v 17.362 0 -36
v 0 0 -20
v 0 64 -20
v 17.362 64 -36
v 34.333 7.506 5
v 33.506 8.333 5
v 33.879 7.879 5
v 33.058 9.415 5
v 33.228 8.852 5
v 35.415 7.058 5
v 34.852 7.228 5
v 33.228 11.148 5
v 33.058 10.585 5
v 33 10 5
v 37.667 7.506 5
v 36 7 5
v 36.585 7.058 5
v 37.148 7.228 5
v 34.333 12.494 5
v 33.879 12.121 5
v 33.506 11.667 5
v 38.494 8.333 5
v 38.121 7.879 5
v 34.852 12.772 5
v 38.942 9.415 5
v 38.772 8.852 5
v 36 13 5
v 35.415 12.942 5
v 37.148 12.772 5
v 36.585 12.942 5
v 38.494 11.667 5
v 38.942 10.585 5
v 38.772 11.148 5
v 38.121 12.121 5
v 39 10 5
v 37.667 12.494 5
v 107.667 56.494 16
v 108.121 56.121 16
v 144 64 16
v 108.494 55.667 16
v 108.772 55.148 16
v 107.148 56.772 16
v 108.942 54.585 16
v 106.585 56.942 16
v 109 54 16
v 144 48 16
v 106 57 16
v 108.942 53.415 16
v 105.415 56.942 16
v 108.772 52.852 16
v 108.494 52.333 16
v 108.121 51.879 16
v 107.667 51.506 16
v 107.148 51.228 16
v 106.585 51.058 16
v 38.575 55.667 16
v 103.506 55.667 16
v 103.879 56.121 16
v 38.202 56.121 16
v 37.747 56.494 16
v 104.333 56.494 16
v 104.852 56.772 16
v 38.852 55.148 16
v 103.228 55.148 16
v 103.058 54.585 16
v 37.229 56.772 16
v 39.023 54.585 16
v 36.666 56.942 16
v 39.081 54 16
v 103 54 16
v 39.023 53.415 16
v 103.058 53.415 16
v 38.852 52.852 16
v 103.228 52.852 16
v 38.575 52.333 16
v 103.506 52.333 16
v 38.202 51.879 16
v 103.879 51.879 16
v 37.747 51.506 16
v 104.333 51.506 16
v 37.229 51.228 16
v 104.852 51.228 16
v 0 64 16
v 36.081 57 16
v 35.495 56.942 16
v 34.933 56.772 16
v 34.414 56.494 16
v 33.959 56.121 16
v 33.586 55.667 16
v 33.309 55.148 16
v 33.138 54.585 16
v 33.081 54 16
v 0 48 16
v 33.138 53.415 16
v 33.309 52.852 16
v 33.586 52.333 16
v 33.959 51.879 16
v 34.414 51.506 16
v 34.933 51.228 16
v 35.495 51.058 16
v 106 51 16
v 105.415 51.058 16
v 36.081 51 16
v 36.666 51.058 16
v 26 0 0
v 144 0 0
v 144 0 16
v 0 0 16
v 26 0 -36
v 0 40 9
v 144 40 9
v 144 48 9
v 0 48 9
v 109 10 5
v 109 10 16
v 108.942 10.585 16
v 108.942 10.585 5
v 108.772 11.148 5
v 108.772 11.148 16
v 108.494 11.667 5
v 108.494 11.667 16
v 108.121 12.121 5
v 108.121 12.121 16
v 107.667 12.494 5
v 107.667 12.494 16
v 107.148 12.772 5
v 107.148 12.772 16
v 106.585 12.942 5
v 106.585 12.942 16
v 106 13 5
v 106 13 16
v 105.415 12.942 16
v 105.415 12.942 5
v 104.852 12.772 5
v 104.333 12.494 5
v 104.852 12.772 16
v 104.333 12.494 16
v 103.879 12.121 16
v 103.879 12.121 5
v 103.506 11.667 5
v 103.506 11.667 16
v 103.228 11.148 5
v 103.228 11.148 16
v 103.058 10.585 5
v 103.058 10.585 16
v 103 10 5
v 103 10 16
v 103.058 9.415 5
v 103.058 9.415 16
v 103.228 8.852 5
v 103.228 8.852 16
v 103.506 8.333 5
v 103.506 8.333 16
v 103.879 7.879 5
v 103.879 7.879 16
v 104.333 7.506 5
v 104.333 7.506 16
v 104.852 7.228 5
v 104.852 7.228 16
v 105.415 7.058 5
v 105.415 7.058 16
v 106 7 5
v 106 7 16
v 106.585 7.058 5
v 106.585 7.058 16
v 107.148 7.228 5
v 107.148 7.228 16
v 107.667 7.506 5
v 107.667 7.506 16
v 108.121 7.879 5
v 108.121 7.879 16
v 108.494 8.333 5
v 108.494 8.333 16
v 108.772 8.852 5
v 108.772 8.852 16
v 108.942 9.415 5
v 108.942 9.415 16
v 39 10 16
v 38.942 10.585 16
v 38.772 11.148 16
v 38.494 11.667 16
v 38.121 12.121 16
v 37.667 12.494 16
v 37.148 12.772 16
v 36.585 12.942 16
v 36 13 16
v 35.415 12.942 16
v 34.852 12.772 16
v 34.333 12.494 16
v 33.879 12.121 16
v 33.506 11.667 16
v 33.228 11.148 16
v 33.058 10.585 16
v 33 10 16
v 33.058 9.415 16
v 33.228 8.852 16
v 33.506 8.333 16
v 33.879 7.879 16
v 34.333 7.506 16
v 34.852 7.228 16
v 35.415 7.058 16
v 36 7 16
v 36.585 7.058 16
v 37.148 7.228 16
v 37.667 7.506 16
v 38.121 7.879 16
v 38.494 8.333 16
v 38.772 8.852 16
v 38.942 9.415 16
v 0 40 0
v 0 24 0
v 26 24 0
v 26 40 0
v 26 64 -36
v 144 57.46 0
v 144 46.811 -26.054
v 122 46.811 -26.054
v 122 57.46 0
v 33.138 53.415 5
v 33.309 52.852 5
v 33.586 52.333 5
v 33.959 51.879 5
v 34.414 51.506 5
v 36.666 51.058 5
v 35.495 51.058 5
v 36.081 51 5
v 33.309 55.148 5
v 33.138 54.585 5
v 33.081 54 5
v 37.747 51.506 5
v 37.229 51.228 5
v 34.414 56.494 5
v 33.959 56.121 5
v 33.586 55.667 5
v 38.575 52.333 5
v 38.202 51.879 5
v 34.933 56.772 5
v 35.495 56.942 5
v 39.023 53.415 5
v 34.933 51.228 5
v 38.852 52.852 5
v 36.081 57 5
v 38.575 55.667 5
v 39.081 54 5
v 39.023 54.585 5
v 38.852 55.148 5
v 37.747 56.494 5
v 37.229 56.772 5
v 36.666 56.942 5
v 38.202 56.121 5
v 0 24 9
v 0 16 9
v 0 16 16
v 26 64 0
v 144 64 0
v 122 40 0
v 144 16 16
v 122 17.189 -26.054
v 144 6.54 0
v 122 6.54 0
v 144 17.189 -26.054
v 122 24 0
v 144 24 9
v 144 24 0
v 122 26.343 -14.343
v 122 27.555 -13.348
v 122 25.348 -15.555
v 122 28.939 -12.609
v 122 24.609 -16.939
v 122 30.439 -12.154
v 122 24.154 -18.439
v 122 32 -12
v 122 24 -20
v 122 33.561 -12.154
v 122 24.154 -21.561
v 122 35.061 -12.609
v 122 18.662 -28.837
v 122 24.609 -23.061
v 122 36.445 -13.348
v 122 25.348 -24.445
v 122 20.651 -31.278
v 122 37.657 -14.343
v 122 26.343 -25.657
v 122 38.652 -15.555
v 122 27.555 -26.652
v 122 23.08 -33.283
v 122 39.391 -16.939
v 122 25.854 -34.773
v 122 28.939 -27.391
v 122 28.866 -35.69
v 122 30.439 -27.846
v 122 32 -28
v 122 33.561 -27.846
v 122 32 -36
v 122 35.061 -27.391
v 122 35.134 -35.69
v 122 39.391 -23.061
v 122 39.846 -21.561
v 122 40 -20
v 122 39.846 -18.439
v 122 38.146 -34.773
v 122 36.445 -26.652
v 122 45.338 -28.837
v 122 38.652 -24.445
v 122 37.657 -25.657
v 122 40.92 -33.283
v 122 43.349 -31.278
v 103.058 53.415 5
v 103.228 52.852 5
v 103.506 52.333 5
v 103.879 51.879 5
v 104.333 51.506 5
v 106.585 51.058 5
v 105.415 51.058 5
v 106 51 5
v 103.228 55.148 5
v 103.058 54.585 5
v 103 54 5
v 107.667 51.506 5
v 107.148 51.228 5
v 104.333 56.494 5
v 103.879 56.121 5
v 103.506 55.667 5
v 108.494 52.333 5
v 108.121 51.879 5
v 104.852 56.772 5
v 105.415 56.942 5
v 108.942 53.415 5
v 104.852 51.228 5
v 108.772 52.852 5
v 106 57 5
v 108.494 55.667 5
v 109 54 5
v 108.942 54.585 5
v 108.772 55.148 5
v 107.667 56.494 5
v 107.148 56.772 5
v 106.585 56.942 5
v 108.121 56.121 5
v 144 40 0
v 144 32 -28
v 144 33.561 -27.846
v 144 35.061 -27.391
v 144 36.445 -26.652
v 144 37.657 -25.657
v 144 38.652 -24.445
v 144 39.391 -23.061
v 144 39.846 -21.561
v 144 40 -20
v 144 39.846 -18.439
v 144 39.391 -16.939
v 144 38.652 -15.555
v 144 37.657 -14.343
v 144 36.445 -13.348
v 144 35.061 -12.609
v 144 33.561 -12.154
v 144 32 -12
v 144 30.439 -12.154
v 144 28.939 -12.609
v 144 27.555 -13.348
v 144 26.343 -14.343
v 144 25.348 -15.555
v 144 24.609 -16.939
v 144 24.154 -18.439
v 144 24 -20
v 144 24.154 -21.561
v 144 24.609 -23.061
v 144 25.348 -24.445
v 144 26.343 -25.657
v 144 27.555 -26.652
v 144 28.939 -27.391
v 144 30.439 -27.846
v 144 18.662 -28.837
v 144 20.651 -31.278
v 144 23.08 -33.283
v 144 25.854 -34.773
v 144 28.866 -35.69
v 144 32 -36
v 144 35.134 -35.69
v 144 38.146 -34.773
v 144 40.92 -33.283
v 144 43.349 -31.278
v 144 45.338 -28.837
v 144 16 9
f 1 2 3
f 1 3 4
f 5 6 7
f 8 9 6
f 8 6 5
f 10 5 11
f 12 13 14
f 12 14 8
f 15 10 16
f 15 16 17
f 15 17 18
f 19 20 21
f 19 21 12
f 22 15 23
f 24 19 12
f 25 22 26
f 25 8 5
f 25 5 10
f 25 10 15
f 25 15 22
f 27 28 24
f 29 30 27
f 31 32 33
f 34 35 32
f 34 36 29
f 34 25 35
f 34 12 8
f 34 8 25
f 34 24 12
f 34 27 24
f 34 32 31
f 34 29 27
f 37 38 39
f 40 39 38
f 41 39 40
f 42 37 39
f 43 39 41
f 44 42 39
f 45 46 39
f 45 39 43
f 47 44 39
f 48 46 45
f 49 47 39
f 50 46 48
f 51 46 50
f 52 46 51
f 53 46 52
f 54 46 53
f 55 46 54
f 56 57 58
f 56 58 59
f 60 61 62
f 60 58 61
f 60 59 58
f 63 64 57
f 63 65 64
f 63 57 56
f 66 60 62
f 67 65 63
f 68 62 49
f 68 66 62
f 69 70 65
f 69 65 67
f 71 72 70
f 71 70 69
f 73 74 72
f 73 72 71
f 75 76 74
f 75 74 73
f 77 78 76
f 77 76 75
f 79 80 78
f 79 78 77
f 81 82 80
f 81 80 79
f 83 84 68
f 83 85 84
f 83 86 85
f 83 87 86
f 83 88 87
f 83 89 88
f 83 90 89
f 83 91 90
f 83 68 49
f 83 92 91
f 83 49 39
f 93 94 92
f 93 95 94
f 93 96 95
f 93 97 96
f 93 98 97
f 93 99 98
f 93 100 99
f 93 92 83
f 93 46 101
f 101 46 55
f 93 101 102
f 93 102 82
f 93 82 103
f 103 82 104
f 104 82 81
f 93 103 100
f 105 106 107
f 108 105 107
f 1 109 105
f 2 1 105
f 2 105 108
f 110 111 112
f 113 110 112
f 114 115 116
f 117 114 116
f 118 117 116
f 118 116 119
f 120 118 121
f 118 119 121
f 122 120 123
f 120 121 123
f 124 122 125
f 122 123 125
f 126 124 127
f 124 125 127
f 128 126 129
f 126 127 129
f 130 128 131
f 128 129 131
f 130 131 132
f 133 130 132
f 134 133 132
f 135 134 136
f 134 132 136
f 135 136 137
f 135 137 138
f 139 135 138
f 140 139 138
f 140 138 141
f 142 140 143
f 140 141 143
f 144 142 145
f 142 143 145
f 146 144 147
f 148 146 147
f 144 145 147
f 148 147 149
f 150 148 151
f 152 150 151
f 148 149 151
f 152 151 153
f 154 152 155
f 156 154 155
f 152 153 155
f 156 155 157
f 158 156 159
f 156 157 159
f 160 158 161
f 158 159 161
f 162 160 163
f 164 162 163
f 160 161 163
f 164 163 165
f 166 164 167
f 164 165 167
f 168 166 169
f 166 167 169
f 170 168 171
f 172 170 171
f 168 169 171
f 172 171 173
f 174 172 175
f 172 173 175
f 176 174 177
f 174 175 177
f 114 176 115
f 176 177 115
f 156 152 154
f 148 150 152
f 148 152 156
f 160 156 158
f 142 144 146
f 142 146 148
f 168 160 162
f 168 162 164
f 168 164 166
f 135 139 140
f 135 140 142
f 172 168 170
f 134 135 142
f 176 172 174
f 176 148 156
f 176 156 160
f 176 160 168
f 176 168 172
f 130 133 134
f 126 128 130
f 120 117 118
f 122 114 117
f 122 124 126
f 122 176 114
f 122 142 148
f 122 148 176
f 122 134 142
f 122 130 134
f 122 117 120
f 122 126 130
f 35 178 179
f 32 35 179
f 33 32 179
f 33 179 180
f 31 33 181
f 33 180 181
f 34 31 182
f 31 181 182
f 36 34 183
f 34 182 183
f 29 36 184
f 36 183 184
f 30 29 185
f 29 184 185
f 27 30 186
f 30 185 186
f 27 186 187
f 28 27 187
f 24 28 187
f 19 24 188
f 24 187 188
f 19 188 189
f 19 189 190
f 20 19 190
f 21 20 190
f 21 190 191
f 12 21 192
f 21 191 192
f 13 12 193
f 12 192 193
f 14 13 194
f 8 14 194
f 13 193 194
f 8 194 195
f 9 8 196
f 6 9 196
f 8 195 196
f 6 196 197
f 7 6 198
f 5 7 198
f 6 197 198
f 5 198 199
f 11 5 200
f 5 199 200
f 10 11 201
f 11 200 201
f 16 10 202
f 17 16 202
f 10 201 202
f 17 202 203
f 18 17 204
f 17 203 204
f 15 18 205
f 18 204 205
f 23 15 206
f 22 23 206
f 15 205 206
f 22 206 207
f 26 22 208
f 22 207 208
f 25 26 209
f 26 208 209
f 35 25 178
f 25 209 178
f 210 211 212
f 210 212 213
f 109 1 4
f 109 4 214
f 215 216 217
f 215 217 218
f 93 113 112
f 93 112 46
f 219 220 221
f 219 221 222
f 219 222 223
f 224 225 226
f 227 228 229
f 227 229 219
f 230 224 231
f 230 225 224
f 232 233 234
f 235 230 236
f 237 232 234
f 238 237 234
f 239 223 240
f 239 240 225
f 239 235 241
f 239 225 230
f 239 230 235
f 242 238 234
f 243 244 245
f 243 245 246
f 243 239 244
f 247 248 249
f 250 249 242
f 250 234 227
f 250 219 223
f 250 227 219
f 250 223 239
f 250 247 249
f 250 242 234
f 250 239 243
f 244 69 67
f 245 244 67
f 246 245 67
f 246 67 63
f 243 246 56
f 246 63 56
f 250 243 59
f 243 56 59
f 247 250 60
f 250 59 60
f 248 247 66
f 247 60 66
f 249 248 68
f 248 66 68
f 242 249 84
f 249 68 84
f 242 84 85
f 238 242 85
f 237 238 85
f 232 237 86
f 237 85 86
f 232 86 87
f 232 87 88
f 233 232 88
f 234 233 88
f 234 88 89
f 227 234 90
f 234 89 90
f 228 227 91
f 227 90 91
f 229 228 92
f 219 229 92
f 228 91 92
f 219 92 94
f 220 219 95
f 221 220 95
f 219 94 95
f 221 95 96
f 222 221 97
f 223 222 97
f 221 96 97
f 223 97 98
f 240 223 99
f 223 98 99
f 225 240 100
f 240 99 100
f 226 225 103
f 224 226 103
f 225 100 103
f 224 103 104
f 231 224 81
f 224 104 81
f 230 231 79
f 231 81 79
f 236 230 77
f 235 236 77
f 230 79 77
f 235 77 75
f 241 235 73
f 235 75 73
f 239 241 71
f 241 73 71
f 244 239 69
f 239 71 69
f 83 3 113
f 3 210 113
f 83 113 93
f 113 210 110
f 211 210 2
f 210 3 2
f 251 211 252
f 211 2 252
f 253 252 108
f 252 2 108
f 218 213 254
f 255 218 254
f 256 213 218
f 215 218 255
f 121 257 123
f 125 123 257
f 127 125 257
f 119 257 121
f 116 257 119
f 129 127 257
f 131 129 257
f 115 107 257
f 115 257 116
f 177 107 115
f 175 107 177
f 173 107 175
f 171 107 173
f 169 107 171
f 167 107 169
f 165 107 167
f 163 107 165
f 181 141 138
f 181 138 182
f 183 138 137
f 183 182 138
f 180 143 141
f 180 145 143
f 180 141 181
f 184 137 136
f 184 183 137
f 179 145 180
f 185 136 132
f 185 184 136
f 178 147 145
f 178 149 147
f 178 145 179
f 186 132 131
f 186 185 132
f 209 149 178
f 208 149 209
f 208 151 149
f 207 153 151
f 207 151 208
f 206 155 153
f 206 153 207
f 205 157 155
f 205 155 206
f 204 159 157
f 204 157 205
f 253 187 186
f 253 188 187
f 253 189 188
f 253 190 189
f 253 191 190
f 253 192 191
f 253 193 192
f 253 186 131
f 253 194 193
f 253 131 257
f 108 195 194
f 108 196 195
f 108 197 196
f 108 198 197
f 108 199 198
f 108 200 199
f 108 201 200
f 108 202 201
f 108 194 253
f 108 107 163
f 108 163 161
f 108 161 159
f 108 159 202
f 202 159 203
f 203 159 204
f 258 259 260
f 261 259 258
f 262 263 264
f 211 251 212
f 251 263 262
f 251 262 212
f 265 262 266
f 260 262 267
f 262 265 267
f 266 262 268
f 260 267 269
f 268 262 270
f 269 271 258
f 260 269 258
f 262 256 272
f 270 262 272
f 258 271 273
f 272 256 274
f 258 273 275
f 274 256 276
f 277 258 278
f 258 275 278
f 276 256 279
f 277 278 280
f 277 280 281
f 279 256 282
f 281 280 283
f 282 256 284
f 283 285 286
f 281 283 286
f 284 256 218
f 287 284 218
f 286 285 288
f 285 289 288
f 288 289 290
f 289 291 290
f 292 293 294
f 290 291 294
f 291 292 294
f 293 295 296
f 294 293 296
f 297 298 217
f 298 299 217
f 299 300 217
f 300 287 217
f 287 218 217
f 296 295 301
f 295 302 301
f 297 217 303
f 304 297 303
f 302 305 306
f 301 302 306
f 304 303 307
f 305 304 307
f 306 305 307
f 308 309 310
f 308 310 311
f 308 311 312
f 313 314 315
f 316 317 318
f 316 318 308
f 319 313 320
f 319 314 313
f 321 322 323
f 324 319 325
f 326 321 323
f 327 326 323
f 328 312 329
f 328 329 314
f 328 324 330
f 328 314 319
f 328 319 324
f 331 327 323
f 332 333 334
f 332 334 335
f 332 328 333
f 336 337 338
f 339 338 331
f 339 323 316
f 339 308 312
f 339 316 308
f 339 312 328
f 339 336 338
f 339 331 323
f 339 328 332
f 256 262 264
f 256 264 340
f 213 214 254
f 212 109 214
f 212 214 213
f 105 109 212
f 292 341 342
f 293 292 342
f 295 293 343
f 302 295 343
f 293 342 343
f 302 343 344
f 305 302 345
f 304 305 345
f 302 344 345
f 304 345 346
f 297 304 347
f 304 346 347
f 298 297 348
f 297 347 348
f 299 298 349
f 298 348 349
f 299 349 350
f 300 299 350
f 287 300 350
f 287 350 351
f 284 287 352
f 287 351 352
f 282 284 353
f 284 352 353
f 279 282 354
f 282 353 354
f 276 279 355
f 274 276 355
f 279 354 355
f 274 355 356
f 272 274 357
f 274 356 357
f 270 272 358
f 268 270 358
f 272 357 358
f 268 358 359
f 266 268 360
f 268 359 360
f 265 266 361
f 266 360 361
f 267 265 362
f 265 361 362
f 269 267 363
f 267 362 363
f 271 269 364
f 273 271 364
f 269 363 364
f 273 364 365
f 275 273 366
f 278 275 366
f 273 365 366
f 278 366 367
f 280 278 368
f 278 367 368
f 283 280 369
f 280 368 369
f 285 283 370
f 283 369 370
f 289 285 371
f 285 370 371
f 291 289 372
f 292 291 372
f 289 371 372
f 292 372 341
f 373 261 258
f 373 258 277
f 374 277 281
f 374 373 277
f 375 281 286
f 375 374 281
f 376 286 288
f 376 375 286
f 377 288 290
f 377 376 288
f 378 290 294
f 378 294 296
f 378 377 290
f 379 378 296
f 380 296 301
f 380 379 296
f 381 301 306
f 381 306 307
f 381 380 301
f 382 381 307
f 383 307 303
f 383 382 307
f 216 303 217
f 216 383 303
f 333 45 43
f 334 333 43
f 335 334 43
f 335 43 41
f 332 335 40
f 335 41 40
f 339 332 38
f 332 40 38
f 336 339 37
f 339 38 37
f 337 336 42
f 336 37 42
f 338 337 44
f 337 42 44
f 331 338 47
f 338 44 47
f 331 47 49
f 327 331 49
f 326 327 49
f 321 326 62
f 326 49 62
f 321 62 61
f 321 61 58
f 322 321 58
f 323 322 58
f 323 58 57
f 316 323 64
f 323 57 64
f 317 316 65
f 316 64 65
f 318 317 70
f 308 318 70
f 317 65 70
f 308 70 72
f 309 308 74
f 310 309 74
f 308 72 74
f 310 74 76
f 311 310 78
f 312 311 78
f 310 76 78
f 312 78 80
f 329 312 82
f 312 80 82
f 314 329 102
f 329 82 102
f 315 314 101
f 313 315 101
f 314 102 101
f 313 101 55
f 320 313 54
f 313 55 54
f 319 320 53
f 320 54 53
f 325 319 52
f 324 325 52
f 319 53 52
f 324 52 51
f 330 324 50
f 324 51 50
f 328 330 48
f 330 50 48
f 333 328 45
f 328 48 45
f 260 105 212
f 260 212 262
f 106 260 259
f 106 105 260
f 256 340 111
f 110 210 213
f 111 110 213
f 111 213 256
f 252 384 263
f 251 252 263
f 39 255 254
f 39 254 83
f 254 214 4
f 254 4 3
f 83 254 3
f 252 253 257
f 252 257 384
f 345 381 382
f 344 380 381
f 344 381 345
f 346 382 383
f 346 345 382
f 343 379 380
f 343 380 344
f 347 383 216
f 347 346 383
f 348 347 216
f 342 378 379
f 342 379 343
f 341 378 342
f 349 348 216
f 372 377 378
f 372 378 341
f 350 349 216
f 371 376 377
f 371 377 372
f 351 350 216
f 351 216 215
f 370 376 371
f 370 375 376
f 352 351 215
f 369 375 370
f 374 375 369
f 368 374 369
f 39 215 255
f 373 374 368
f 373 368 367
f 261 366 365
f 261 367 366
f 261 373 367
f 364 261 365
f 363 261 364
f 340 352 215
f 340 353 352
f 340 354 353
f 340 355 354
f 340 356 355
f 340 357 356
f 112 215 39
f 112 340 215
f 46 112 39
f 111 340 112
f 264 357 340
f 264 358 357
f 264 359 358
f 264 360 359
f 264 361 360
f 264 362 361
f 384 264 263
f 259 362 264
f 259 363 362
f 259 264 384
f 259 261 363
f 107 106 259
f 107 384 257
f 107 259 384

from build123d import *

# Parameters (mm, degrees)
BOSS_EXTRUDE2_DEPTH     = 64
SKETCH8_R               = 8
BOSS_EXTRUDE3_DEPTH     = 22
CUT_EXTRUDE1_DEPTH      = 162.641578809
CUT_EXTRUDE1_DEPTH_BACK = 162.641578809
SKETCH9_R               = 3
CUT_EXTRUDE2_DEPTH      = 11


with BuildPart() as part:
    # Sketch3 → Boss-Extrude2 (new body)
    with BuildSketch(Plane(origin=(0, 0, 0), x_dir=(1, 0, 0), z_dir=(0, 1, 0))):
        Polygon((26, 36), (26, 0), (144, 0), (144, -16), (0, -16), (0, 0), (0, 20), (17.362220716, 36), align=None)
    extrude(amount=BOSS_EXTRUDE2_DEPTH)

    # Sketch8 → Boss-Extrude3 (add)
    with BuildSketch(Plane(origin=(144, 0, 0), x_dir=(0, 0, -1), z_dir=(1, 0, 0))):
        with BuildLine():
            Line((26.053796804, 46.810521404), (-16, 64))
            Line((-16, 64), (-16, 48))
            Line((-16, 48), (-9, 48))
            Line((-9, 48), (-9, 40))
            Line((-9, 40), (0, 40))
            Line((0, 40), (0, 24))
            Line((0, 24), (-9, 24))
            Line((-9, 24), (-9, 16))
            Line((-9, 16), (-16, 16))
            Line((-16, 16), (-16, 0))
            Line((-16, 0), (26.053796804, 17.189478596))
            ThreePointArc((26.053796804, 17.189478596), (36, 32), (26.053796804, 46.810521404))
        make_face()
        with Locations((20, 32)):
            Circle(SKETCH8_R, mode=Mode.SUBTRACT)
    extrude(amount=-BOSS_EXTRUDE3_DEPTH)

    # Sketch8<6> → Cut-Extrude1 (cut, two sides: drawn at the far end of the back side and taken through both)
    with BuildSketch(Plane(origin=(144, 0, 0), x_dir=(0, 0, -1), z_dir=(1, 0, 0)).offset(-CUT_EXTRUDE1_DEPTH_BACK)):
        Polygon((0, 40), (-9, 40), (-9, 48), (-16, 48), (-16, 16), (-9, 16), (-9, 24), (0, 24), align=None)
    extrude(amount=CUT_EXTRUDE1_DEPTH + CUT_EXTRUDE1_DEPTH_BACK, mode=Mode.SUBTRACT)

    # Sketch9 → Cut-Extrude2 (cut)
    with BuildSketch(Plane.XY.offset(16)):
        with Locations((106, 54)):
            Circle(SKETCH9_R)
        with Locations((106, 10)):
            Circle(SKETCH9_R)
        with Locations((36.080551107, 54)):
            Circle(SKETCH9_R)
        with Locations((36, 10)):
            Circle(SKETCH9_R)
    extrude(amount=-CUT_EXTRUDE2_DEPTH, mode=Mode.SUBTRACT)


solid = part.part
